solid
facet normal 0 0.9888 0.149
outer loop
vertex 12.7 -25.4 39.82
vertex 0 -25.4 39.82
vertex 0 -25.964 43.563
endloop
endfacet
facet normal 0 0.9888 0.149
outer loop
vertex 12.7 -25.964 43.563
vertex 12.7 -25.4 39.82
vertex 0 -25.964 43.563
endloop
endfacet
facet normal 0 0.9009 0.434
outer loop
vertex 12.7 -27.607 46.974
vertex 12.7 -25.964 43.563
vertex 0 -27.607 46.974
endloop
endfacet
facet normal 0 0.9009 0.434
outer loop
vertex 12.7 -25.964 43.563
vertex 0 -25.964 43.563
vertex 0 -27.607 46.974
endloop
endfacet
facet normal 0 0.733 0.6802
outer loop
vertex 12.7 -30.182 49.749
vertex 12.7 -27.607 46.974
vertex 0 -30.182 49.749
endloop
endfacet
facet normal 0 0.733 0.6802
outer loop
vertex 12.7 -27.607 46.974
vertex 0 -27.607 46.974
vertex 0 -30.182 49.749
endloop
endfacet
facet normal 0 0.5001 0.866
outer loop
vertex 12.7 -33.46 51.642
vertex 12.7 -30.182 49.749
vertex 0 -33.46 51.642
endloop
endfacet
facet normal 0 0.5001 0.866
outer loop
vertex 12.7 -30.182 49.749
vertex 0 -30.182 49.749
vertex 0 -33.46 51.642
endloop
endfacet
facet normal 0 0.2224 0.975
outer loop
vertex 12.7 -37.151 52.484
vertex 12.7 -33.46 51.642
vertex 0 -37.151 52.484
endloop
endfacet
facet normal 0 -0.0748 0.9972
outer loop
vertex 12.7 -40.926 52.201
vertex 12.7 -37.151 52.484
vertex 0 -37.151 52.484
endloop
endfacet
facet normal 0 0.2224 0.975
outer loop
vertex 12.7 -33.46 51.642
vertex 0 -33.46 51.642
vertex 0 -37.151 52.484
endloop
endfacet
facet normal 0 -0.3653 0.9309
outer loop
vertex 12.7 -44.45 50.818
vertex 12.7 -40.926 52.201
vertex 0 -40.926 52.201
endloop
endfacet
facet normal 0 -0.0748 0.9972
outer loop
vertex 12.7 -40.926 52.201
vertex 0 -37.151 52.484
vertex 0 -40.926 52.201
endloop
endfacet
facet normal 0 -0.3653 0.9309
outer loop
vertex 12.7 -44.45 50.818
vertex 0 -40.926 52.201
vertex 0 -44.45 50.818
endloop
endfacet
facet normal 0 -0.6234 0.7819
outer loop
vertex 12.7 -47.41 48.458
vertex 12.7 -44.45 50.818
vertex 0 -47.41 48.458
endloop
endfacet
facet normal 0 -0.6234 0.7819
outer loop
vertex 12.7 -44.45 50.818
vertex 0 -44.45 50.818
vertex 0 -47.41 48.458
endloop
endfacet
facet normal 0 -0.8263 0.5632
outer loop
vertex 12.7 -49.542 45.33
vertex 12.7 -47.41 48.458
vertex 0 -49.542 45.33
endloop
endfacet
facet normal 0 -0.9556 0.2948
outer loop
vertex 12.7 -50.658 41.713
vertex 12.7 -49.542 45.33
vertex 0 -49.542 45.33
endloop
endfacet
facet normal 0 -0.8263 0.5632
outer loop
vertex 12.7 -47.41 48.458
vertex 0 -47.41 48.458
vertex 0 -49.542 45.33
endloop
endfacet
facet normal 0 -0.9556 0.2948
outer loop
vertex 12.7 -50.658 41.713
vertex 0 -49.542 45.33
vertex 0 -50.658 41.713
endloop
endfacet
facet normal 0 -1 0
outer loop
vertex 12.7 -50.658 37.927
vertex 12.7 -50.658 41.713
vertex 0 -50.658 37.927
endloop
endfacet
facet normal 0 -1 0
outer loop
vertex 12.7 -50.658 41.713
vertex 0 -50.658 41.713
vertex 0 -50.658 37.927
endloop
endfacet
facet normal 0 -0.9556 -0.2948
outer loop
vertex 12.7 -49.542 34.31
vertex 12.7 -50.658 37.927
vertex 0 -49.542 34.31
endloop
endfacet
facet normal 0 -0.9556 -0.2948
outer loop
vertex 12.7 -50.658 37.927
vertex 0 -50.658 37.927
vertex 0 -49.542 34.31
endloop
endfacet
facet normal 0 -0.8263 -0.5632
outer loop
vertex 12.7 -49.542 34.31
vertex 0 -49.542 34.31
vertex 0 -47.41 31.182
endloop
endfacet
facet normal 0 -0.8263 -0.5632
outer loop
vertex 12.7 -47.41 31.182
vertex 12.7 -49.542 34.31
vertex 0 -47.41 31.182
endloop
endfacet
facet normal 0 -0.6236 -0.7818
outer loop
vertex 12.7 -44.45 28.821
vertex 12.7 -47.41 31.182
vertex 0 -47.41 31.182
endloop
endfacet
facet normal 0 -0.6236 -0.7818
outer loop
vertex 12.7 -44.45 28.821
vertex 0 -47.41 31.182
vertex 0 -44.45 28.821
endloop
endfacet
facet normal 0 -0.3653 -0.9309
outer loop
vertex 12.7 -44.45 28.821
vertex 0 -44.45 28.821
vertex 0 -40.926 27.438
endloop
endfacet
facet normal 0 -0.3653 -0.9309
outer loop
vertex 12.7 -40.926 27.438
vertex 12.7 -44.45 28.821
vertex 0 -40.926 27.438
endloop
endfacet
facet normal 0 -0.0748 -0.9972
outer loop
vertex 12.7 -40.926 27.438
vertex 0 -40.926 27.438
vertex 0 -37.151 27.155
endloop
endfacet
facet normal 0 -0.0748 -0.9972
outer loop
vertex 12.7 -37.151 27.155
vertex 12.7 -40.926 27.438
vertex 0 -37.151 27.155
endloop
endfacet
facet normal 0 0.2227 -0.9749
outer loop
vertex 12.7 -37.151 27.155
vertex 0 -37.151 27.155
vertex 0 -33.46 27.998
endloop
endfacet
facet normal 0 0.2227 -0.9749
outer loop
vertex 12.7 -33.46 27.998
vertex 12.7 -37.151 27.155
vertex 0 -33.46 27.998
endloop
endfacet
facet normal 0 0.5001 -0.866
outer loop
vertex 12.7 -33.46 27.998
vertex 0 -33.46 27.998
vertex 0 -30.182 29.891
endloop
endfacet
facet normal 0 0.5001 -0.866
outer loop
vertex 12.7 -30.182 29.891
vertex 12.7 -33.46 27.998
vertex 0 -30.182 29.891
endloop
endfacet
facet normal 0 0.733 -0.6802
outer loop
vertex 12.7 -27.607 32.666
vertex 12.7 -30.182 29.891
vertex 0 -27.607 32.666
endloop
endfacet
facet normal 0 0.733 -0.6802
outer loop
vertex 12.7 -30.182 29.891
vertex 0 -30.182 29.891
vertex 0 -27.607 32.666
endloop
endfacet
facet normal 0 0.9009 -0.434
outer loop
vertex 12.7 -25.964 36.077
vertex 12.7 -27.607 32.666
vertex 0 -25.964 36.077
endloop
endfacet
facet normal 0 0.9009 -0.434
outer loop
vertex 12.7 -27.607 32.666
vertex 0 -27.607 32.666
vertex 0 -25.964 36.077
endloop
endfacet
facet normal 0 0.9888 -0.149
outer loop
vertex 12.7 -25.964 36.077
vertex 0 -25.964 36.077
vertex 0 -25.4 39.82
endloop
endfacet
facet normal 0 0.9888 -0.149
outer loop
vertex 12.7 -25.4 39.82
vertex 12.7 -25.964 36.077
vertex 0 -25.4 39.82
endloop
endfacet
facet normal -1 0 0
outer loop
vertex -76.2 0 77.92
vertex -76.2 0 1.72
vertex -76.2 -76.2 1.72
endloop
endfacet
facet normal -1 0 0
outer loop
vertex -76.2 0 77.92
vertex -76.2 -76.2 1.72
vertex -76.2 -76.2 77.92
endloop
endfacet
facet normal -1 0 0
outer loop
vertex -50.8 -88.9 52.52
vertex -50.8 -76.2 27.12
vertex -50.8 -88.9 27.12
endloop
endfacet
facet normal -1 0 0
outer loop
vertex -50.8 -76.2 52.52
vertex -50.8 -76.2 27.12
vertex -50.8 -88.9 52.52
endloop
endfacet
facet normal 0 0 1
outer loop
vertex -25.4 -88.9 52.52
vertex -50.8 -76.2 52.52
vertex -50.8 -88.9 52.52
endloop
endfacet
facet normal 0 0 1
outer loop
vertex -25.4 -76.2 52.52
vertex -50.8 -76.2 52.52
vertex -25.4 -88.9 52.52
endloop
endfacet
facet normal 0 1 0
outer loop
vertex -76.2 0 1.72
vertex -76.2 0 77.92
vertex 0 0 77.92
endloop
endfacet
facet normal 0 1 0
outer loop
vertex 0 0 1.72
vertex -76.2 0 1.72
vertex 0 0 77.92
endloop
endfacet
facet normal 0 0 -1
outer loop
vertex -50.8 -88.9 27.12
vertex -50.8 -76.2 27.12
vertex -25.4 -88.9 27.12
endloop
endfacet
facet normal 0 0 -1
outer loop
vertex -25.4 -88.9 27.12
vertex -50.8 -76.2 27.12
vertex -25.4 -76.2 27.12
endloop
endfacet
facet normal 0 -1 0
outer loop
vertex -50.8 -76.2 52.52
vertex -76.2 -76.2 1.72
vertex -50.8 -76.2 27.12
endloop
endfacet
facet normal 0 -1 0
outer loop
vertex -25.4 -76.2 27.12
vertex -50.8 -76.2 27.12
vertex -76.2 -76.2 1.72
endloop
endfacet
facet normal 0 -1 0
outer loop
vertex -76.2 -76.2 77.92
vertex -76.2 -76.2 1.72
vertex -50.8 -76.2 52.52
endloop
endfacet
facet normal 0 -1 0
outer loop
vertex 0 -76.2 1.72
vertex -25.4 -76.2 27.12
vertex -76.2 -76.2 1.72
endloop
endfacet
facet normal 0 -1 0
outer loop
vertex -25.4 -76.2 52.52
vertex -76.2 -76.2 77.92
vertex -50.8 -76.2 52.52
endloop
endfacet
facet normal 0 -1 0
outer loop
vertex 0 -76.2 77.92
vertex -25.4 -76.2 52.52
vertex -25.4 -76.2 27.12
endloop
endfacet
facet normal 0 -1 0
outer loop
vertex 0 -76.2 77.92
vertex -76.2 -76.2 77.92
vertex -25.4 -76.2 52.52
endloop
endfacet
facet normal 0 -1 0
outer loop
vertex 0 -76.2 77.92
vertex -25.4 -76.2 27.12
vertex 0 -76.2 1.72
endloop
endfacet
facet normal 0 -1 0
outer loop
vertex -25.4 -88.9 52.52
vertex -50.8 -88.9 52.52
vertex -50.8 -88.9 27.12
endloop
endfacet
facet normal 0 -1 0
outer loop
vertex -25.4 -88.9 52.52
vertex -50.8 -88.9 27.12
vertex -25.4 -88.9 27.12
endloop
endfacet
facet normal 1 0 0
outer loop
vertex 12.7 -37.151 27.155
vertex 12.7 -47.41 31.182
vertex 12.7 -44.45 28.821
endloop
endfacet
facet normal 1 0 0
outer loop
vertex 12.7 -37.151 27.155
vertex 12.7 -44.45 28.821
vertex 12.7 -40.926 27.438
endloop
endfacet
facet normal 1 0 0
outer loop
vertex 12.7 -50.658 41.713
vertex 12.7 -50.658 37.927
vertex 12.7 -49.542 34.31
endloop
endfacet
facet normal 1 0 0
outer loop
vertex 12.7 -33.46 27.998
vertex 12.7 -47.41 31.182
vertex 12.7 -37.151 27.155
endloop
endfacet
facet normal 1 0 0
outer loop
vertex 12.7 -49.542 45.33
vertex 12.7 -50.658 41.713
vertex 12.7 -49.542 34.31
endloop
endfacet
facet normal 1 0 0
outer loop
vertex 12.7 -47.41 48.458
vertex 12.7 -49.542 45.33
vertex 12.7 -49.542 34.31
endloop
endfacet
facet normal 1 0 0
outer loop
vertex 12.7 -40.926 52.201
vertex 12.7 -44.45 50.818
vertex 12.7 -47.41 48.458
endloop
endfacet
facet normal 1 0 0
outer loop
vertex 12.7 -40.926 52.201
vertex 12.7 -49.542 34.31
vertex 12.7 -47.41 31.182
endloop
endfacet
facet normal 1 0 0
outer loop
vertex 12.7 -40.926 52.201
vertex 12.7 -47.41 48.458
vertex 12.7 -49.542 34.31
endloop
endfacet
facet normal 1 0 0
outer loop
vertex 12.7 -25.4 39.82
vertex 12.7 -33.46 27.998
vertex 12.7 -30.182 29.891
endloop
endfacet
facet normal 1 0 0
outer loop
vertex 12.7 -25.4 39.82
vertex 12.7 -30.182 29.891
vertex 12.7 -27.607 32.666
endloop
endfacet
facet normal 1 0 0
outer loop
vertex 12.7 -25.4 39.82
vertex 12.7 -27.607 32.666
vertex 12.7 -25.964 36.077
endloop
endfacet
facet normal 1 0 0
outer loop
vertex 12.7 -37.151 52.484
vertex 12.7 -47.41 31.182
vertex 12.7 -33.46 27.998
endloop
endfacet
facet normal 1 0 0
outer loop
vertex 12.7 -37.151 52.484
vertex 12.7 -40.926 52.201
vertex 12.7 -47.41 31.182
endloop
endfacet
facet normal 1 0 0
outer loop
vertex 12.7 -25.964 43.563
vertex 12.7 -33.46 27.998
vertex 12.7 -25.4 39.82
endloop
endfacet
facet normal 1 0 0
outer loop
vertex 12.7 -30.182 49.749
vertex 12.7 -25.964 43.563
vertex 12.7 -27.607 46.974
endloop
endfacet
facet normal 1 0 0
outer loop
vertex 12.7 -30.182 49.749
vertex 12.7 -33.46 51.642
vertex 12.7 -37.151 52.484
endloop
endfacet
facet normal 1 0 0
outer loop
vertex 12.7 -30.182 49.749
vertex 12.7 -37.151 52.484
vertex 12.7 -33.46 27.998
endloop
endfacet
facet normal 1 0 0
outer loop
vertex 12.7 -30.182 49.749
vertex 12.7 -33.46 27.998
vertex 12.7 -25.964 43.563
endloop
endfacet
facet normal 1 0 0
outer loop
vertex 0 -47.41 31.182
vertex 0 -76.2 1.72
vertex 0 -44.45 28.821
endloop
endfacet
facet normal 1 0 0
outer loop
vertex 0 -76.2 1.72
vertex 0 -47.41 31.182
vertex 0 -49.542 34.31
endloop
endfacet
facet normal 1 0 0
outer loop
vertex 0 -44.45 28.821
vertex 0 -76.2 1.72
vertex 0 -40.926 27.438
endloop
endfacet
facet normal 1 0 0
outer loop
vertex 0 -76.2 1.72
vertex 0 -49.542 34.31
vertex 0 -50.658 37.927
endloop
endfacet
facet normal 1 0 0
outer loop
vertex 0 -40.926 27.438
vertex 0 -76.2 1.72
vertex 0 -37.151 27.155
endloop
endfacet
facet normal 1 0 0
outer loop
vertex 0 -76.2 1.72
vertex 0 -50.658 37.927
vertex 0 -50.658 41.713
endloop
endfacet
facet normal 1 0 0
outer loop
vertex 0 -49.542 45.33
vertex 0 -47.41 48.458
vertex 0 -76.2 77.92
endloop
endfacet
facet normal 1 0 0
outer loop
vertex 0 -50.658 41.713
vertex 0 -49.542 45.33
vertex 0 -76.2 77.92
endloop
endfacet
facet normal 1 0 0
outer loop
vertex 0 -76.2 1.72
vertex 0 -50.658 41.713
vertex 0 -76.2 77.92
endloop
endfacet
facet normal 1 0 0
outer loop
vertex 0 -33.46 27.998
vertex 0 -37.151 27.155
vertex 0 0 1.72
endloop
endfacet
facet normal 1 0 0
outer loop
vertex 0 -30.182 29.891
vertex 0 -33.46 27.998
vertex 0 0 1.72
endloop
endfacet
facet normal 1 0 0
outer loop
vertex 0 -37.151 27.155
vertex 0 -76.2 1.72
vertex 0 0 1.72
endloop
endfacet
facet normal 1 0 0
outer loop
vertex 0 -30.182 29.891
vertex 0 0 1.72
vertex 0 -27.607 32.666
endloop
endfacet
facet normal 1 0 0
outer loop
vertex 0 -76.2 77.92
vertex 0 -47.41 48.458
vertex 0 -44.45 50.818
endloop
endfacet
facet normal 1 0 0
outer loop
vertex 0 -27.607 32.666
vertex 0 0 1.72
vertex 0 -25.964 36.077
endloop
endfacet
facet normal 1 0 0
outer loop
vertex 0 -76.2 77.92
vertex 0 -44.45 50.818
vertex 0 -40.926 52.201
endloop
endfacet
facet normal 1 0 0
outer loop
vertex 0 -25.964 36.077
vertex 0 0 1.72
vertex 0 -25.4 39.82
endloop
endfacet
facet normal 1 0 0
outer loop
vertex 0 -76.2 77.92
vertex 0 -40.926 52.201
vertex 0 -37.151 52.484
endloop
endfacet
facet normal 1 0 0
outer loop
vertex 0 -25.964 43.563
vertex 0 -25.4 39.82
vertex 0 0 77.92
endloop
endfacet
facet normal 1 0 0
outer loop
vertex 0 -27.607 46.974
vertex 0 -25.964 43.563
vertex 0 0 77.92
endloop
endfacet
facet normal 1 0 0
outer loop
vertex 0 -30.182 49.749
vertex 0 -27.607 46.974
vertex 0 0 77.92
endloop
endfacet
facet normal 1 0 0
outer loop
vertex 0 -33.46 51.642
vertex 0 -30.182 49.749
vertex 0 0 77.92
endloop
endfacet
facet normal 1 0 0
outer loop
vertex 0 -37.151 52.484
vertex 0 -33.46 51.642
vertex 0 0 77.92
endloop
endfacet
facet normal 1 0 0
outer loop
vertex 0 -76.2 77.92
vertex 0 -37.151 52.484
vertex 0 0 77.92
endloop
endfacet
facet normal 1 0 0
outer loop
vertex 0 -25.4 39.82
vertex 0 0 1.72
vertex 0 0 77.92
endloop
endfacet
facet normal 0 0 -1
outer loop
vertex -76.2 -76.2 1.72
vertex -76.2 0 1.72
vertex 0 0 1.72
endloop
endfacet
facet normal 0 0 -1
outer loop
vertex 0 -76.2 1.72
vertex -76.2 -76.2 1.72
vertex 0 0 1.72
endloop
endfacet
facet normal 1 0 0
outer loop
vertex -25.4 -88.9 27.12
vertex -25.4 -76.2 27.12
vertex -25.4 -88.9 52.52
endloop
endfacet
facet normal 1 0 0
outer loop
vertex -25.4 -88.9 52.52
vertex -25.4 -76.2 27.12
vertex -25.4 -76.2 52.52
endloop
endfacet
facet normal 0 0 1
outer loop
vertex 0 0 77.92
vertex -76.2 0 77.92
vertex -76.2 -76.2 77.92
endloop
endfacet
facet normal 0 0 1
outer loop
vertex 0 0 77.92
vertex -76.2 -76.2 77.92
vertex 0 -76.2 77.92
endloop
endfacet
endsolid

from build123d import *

# Parameters (mm, degrees)
F0_W     = 76.2
F0_H     = 76.2
F1_DEPTH = 76.2
F2_W     = 25.4
F2_H     = 25.4
F3_DEPTH = 12.7
F4_R     = 12.7
F5_DEPTH = 12.7


with BuildPart() as f1:
    # F0 (on Front) → F1 (new body)
    with BuildSketch(Plane.XZ):
        with Locations((-38.1, 39.819894)):
            Rectangle(F0_W, F0_H)
    extrude(amount=F1_DEPTH)

    # F2 (on face) → F3 (join)
    with BuildSketch(Plane.XZ.offset(76.2)):
        with Locations((-38.1, 39.819894)):
            Rectangle(F2_W, F2_H)
    extrude(amount=F3_DEPTH)

    # F4 (on face) → F5 (join)
    with BuildSketch(Plane.YZ):
        with Locations((-38.1, 39.819894)):
            Circle(F4_R)
    extrude(amount=F5_DEPTH)


solid = f1.part
